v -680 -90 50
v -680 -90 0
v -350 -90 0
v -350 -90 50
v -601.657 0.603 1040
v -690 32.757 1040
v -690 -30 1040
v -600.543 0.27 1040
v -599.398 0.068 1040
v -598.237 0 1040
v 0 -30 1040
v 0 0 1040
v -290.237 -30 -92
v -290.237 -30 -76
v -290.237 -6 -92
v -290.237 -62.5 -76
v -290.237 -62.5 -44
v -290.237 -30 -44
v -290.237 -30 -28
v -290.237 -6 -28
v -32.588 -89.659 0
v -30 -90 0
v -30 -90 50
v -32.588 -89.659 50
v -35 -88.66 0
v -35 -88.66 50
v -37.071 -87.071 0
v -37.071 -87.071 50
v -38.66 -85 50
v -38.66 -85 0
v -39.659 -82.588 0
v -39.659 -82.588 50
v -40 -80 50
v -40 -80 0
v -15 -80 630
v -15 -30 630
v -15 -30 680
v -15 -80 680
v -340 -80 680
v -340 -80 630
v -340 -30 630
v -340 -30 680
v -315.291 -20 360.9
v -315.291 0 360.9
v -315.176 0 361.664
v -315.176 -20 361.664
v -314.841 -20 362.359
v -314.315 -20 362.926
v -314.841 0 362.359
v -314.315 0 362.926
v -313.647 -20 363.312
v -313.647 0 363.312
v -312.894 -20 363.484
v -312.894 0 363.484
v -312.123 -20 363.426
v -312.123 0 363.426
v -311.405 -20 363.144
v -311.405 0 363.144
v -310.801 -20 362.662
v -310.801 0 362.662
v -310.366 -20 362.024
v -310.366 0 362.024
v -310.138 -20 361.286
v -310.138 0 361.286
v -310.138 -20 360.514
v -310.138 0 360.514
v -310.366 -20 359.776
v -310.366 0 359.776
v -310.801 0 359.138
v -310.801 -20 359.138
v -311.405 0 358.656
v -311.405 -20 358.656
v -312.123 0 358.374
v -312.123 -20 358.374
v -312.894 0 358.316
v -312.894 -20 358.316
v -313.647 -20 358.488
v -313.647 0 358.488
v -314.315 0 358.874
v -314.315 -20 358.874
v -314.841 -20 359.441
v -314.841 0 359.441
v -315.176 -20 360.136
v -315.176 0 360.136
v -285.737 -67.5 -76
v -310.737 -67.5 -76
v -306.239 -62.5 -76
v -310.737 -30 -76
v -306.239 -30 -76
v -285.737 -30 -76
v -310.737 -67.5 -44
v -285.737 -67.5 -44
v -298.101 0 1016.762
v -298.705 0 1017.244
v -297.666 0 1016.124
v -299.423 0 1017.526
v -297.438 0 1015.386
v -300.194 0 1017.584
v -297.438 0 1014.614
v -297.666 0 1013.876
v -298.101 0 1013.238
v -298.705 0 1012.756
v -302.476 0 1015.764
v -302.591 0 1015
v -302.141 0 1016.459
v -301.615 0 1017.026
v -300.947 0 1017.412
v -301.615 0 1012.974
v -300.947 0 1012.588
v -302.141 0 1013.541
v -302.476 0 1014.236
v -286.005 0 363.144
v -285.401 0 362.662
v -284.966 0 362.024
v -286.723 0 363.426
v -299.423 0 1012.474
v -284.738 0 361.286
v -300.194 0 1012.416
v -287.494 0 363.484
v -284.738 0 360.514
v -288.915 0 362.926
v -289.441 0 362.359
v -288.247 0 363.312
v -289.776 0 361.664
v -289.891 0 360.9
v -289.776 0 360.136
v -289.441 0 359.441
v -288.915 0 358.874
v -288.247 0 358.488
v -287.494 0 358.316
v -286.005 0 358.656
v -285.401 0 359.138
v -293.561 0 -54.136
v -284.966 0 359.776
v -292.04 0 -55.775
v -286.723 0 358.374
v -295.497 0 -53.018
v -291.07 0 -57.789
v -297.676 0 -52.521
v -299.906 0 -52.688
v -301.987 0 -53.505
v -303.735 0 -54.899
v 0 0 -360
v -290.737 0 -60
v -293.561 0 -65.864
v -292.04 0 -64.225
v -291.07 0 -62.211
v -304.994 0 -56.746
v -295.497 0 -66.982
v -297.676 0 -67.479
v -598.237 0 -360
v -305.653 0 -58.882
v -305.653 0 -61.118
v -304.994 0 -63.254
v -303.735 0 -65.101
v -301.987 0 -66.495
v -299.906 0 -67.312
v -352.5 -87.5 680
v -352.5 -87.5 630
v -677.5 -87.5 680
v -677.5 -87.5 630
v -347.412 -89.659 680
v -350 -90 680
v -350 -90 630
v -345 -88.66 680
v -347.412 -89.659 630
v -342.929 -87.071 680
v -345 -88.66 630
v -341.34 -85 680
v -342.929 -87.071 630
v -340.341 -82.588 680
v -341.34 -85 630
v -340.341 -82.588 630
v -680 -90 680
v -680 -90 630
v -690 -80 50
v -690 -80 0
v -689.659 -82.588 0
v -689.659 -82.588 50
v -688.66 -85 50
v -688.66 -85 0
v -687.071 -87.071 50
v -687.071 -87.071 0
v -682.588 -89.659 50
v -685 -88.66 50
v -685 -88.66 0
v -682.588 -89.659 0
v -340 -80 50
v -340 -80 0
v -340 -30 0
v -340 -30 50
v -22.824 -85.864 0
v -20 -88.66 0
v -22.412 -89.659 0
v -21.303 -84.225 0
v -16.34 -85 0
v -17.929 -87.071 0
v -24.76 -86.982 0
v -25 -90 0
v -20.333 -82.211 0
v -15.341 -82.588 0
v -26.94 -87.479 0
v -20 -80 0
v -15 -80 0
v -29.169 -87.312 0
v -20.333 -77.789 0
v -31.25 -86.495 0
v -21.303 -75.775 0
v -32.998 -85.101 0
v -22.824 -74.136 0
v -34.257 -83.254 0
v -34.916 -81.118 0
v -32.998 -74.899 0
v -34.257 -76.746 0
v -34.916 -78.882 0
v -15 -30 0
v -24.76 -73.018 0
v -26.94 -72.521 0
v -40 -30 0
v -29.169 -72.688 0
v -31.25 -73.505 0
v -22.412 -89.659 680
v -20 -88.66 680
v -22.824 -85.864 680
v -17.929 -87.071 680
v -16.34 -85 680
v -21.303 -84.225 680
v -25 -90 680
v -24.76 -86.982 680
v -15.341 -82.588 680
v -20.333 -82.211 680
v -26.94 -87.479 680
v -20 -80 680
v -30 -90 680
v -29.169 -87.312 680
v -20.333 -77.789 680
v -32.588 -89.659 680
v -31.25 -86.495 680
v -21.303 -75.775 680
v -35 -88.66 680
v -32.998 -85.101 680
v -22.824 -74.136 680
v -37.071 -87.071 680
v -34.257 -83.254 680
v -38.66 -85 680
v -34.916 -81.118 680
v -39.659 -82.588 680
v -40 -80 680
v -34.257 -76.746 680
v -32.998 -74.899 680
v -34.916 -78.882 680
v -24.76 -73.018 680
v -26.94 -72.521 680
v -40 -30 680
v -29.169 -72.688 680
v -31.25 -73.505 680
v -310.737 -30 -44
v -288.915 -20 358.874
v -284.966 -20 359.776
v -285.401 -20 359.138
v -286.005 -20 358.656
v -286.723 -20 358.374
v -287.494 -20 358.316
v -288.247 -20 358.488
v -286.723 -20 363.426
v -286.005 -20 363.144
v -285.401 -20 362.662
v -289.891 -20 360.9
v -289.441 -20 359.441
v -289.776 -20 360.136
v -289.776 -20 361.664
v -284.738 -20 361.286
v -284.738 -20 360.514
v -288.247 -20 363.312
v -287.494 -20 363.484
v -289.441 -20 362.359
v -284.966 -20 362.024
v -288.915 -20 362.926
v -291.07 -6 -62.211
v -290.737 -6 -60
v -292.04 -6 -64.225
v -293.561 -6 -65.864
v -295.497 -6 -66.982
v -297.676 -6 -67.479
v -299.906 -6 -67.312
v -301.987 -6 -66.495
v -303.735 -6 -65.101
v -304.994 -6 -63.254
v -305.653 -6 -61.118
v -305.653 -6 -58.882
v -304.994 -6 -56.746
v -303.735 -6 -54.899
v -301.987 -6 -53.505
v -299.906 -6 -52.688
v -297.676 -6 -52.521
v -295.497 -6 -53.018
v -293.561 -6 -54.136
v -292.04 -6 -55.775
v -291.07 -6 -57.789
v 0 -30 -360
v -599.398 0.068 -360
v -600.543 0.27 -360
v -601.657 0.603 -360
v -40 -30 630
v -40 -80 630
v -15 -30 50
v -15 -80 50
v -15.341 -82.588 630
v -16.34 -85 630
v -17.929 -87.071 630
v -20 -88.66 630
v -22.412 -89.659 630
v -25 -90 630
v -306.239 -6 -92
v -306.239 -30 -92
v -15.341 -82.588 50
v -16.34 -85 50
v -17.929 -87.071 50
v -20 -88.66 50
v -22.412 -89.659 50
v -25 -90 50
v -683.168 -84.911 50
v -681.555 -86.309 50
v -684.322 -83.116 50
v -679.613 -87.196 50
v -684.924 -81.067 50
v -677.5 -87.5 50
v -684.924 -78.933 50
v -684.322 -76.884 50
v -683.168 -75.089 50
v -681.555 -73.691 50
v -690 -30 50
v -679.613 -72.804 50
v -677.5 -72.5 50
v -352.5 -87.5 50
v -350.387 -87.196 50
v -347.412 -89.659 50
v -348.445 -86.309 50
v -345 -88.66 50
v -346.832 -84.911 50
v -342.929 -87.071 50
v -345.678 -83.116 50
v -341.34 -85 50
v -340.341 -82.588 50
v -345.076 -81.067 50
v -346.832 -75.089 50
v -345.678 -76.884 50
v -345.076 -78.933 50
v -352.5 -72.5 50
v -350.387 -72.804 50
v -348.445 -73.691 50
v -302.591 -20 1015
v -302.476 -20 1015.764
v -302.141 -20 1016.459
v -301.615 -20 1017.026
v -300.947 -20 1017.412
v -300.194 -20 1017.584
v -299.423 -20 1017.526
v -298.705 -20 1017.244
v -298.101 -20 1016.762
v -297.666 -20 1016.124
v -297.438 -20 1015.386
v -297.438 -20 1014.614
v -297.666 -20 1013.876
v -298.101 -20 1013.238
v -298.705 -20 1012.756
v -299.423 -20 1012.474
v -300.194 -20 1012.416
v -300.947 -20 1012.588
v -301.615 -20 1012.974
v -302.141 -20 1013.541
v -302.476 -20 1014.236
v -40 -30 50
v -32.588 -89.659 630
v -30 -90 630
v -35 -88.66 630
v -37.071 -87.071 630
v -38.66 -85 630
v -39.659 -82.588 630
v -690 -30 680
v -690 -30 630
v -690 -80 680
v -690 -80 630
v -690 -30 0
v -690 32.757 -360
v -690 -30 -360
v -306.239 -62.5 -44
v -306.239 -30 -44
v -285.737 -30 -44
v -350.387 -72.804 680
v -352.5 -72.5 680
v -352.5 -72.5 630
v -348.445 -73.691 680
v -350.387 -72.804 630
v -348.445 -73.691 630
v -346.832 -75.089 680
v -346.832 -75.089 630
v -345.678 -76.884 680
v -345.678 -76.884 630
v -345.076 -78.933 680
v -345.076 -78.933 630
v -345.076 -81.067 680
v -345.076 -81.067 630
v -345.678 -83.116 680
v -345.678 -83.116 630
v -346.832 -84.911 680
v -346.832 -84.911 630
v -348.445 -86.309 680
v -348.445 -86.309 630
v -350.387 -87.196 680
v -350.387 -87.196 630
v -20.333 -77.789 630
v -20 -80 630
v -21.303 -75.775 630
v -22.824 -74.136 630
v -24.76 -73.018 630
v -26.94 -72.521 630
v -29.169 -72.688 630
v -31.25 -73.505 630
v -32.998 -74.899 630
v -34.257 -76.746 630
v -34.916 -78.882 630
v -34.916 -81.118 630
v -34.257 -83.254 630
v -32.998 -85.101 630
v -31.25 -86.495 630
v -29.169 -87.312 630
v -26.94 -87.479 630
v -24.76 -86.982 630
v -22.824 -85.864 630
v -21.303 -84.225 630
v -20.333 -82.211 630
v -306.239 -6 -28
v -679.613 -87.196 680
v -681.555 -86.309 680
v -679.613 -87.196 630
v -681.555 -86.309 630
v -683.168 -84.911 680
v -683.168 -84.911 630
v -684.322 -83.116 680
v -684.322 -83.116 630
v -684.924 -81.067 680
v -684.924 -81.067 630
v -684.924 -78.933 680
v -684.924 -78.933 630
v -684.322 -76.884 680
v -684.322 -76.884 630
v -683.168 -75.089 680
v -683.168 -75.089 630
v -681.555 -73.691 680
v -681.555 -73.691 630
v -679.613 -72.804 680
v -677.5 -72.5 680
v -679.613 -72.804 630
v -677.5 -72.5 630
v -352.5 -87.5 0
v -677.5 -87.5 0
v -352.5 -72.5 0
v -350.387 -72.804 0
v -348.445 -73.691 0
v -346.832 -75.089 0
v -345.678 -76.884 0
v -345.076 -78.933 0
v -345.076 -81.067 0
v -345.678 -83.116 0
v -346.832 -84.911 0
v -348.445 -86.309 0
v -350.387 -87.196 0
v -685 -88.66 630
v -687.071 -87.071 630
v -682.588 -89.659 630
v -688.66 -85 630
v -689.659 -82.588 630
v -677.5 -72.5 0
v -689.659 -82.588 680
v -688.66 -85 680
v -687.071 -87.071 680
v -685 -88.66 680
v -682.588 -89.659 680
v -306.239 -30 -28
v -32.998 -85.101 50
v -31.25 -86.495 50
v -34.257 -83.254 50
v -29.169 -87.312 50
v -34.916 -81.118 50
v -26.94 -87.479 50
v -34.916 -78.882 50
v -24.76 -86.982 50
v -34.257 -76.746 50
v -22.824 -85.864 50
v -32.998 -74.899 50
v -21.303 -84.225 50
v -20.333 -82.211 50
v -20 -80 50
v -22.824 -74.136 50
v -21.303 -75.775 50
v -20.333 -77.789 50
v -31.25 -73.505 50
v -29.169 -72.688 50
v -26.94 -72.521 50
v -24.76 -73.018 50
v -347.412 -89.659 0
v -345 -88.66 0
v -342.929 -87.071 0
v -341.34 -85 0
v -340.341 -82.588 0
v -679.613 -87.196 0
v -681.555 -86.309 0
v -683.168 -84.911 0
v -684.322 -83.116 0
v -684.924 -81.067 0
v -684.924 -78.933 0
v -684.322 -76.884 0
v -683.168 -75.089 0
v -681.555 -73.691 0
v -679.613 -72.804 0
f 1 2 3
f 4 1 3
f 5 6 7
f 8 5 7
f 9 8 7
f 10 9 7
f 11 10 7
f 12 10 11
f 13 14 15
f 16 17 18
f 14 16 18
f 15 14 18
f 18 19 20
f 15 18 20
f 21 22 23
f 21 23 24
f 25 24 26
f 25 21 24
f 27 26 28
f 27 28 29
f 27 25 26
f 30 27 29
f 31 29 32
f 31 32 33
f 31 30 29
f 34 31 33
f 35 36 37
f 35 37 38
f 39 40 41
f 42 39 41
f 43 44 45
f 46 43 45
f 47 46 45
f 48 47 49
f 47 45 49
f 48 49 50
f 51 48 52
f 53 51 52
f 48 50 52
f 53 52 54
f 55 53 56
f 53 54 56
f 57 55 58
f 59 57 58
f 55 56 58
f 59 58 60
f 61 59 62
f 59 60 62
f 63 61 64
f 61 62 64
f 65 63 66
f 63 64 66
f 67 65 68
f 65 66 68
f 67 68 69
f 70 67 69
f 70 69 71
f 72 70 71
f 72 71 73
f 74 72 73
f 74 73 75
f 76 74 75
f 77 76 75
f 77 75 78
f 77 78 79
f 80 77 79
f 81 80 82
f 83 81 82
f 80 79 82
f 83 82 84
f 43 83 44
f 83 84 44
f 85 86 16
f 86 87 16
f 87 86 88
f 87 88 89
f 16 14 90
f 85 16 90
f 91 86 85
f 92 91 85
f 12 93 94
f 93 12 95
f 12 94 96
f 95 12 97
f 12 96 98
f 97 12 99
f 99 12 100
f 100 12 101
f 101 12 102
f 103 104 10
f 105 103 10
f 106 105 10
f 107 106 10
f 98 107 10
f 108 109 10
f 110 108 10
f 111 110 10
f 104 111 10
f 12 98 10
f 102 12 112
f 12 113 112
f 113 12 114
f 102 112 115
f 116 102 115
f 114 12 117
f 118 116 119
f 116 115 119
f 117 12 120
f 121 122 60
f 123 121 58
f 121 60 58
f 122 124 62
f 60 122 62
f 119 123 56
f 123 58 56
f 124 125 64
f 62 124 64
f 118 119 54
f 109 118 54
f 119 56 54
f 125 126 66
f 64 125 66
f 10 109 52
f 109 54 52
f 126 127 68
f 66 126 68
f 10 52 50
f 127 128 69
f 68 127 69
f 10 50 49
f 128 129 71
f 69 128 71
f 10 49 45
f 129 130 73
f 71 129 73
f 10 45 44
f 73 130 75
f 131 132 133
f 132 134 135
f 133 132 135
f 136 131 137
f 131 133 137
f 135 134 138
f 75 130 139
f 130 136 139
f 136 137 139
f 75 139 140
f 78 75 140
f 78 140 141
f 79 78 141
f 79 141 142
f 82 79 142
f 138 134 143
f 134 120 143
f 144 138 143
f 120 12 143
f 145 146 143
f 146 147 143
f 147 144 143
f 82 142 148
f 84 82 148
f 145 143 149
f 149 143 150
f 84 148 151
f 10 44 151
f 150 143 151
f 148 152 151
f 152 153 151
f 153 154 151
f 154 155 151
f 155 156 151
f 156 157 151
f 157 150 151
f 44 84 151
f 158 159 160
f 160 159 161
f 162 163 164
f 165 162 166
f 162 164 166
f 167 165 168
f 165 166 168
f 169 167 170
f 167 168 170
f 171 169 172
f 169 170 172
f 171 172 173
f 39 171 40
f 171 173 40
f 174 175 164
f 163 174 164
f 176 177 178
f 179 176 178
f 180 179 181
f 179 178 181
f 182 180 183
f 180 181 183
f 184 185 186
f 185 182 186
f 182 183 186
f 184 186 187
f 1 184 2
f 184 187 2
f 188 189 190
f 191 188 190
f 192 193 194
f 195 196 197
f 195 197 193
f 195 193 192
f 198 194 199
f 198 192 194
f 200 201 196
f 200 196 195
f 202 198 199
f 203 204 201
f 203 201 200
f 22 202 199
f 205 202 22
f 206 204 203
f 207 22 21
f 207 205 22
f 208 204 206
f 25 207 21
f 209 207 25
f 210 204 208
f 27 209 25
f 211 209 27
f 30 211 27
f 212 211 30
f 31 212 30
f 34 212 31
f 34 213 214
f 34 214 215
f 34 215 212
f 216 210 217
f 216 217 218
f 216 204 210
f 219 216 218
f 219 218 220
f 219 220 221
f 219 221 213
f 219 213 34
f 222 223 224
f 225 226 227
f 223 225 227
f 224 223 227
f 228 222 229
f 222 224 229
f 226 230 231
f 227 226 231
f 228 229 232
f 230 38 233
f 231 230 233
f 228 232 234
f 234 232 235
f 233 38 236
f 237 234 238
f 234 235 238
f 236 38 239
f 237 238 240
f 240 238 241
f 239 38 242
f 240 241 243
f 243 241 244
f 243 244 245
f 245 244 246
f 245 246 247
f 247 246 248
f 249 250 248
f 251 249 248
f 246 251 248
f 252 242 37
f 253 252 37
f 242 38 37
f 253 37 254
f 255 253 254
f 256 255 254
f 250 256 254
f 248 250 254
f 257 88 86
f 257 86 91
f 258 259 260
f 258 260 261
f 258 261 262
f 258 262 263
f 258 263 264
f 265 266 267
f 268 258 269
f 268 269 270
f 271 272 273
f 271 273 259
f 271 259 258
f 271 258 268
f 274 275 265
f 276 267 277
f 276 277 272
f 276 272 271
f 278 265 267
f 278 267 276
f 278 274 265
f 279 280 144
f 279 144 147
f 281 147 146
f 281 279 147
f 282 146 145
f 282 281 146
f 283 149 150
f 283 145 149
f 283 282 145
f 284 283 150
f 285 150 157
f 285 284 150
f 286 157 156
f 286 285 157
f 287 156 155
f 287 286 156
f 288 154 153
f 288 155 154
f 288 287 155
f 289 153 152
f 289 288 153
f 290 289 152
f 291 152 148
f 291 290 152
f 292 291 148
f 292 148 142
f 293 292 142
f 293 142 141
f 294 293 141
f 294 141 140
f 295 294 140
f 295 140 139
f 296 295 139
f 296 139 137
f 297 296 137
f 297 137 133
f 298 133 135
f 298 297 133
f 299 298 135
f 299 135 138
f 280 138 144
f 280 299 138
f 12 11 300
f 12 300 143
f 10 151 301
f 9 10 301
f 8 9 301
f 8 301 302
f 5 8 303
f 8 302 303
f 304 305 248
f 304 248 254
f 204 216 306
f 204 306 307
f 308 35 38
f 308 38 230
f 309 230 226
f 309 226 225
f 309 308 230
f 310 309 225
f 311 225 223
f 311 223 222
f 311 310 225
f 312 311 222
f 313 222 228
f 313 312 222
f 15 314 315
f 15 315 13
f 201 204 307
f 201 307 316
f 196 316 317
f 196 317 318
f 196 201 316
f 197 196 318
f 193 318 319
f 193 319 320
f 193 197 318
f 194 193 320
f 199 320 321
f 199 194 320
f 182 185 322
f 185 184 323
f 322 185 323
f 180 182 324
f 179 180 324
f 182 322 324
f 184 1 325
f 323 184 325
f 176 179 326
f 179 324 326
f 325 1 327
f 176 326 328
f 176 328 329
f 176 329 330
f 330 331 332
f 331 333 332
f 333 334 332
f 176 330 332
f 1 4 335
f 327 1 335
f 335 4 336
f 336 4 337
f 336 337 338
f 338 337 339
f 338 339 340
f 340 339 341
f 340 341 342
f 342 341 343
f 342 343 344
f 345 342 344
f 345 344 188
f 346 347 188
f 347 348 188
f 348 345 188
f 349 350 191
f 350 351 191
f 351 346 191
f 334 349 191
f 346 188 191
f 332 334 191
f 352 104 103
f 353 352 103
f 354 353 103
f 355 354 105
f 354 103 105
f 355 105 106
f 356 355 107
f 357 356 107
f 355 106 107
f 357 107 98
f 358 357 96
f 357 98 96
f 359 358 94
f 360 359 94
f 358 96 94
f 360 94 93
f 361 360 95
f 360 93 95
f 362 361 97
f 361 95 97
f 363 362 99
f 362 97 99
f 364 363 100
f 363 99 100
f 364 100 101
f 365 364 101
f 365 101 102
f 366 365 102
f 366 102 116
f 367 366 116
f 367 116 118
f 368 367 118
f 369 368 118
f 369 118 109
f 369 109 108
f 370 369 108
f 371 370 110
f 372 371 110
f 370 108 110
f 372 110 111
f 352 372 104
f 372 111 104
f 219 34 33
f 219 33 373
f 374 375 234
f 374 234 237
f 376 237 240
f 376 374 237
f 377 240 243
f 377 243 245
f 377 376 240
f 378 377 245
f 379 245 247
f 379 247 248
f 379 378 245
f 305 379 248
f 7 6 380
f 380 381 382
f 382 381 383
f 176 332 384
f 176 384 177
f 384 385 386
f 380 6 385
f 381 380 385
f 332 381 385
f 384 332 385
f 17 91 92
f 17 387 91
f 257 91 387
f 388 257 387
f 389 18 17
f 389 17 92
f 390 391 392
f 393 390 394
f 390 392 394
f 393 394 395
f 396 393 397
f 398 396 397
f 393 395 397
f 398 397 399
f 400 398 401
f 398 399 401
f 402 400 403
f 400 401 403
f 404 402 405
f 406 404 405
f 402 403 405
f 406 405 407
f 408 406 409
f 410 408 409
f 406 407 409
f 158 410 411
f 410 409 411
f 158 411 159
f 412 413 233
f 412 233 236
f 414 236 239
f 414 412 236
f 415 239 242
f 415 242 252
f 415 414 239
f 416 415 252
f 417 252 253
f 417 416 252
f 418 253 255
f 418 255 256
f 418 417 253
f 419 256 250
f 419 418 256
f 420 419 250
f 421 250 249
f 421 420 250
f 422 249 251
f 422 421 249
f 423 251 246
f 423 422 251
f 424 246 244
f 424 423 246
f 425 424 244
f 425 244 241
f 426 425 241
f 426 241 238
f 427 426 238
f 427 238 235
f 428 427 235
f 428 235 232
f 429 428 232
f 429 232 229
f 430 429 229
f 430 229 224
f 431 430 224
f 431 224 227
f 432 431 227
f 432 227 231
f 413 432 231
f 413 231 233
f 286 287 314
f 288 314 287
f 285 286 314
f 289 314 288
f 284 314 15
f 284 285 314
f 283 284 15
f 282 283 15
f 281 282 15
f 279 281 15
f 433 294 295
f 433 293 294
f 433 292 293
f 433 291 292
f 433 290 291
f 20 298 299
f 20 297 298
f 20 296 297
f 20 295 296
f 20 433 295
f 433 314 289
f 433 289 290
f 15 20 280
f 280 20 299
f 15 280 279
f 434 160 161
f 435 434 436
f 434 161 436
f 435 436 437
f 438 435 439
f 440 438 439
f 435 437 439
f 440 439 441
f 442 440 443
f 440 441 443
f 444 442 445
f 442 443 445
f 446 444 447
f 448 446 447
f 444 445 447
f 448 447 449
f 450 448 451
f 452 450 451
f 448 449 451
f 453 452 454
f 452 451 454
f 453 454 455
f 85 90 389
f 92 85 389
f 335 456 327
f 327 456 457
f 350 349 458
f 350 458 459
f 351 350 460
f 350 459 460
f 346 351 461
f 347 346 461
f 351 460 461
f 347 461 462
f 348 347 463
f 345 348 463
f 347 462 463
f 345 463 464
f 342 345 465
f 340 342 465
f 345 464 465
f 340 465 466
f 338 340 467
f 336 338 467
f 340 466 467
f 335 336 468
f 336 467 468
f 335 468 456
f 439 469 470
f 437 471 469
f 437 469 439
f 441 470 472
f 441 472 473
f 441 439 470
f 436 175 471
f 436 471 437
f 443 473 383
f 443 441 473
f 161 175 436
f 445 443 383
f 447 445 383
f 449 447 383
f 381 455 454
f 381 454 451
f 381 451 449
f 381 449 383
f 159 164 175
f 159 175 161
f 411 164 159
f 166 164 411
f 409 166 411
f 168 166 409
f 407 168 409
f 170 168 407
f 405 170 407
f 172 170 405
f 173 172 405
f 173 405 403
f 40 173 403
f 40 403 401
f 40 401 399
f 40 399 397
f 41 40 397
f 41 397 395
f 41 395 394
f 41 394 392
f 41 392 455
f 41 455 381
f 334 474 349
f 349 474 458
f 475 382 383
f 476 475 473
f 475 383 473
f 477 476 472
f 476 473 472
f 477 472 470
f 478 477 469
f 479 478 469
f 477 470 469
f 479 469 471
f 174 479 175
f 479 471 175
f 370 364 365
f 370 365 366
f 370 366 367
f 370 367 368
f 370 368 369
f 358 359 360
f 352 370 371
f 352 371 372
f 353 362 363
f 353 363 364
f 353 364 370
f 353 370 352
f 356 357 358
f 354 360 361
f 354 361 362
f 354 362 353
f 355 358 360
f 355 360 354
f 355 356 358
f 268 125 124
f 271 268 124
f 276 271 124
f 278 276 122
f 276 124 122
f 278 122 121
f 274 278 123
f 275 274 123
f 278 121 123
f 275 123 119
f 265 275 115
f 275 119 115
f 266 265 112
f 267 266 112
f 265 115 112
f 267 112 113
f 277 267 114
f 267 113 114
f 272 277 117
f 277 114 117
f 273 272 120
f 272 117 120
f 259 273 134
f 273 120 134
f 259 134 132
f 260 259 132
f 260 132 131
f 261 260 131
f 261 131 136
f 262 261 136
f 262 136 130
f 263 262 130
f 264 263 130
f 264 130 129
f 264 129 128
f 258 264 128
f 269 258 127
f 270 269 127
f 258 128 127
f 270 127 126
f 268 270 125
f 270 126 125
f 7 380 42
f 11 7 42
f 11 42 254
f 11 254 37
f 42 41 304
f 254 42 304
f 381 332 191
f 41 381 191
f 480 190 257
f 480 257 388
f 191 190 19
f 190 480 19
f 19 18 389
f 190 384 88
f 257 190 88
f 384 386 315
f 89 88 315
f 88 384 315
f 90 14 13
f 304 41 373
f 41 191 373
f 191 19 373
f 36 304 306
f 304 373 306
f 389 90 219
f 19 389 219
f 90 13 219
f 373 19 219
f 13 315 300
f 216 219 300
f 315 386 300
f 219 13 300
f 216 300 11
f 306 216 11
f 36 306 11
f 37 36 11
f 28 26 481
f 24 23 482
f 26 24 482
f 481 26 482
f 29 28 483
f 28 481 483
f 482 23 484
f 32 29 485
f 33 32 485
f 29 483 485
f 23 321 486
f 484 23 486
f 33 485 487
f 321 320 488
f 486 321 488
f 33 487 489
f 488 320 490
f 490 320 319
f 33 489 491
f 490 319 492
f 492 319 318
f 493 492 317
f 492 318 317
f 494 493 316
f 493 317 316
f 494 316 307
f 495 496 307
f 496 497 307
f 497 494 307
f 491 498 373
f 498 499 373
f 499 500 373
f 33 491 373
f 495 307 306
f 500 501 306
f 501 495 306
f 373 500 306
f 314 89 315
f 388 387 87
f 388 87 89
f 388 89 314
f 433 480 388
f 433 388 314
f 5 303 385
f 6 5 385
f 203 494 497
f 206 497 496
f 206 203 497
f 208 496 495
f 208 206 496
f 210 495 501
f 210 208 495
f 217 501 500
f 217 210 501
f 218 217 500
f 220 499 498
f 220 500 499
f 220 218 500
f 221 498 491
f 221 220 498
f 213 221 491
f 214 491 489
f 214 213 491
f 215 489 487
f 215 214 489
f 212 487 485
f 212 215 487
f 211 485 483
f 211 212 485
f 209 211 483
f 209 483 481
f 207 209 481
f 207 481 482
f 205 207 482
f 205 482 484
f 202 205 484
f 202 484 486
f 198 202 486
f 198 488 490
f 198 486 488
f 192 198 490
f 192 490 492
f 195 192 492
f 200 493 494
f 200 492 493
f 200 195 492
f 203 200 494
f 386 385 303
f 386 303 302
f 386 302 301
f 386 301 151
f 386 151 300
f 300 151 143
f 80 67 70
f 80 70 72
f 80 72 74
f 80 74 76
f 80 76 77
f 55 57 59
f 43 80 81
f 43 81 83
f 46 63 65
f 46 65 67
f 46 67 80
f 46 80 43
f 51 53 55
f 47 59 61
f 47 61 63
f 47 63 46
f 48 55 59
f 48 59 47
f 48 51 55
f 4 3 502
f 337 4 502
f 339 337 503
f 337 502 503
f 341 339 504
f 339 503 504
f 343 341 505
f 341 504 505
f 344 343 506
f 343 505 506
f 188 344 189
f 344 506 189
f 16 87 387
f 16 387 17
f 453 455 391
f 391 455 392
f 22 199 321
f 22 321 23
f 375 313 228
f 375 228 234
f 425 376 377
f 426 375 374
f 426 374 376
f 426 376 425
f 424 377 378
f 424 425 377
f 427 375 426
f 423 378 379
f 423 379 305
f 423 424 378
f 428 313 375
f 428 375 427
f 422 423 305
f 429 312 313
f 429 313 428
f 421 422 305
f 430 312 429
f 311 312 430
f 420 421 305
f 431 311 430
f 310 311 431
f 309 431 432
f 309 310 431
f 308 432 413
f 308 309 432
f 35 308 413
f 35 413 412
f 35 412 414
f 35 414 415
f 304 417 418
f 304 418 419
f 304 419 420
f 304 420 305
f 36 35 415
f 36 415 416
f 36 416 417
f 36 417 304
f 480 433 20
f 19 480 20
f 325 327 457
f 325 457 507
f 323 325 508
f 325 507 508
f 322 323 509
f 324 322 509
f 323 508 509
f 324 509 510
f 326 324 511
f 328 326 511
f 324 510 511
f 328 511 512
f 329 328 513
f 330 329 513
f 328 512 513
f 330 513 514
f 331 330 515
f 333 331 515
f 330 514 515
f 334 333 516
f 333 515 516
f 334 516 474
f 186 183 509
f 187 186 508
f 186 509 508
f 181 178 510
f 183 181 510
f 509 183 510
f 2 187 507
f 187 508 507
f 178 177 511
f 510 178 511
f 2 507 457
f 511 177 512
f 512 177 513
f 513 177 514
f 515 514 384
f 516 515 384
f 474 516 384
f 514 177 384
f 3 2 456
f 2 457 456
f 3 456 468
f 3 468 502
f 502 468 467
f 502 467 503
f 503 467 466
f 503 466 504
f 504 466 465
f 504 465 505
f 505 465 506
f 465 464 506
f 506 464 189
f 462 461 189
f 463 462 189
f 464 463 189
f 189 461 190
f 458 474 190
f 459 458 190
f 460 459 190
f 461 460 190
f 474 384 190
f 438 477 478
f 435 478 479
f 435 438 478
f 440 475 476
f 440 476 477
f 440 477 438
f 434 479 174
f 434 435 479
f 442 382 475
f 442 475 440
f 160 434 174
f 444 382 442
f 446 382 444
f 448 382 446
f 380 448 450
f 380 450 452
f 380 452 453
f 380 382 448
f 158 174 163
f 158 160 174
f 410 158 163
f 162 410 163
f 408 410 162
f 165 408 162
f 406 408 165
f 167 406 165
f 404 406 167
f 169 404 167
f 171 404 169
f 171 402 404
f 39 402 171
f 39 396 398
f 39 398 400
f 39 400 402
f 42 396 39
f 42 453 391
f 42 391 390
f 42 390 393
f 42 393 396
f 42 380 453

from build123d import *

# Parameters (mm, degrees)
BOSS_EXTRUDE1_DEPTH      = 1040
BOSS_EXTRUDE1_DEPTH_BACK = 360
SKETCH2_R                = 7.5
BOSS_EXTRUDE2_DEPTH      = 680
SKETCH4_W                = 580
SKETCH4_H                = 10
CUT_EXTRUDE1_DEPTH       = 1252.319303775
CUT_EXTRUDE2_DEPTH       = 1252.319303775
CUT_EXTRUDE2_DEPTH_BACK  = 1252.319303775
SKETCH5_W                = 580
SKETCH5_H                = 50
CUT_EXTRUDE3_DEPTH       = 1252.319303775
CUT_EXTRUDE3_DEPTH_BACK  = 1252.319303775
SKETCH6_R                = 7.5
SKETCH8_W                = 25
SKETCH8_H                = 32
BOSS_EXTRUDE4_DEPTH      = 37.5
SKETCH9_W                = 16.002
SKETCH9_H                = 32.5
CUT_EXTRUDE4_DEPTH       = 66.8
SKETCH11_W               = 16.002
SKETCH11_H               = 64
CUT_EXTRUDE5_DEPTH       = 24
SKETCH13_R               = 2.5908
CUT_EXTRUDE6_DEPTH       = 20


with BuildPart() as part:
    # Sketch1 → Boss-Extrude1 (new, two sides: drawn at the far end of the back side and taken through both)
    with BuildSketch(Plane.XY.offset(-BOSS_EXTRUDE1_DEPTH_BACK)):
        with BuildLine():
            Line((0, 0), (-598.236730193, 0))
            ThreePointArc((-598.236730193, 0), (-599.97321197, 0.15192247), (-601.656931626, 0.603073792))
            Line((-601.656931626, 0.603073792), (-690, 32.757321084))
            Line((-690, 32.757321084), (-690, -30))
            Line((-690, -30), (-656.445665216, -30))
            Line((-656.445665216, -30), (-26.446144718, -30))
            Line((-26.446144718, -30), (0, -30))
            Line((0, -30), (0, -20.000479502))
            Line((0, -20.000479502), (0, 0))
        make_face()
    extrude(amount=BOSS_EXTRUDE1_DEPTH + BOSS_EXTRUDE1_DEPTH_BACK)

    # Sketch2 → Boss-Extrude2 (add)
    # profile 1 of 2: a face of its own
    with BuildSketch(Plane.XY):
        with BuildLine():
            Line((-690, -30), (-690, -80))
            ThreePointArc((-690, -80), (-687.071067812, -87.071067812), (-680, -90))
            Line((-680, -90), (-350, -90))
            ThreePointArc((-350, -90), (-342.928932188, -87.071067812), (-340, -80))
            Line((-340, -80), (-340, -30))
            Line((-340, -30), (-690, -30))
        make_face()
        with BuildLine():
            Line((-677.5, -72.5), (-352.5, -72.5))
            ThreePointArc((-352.5, -72.5), (-345, -80), (-352.5, -87.5))
            Line((-352.5, -87.5), (-677.5, -87.5))
            ThreePointArc((-677.5, -87.5), (-685, -80), (-677.5, -72.5))
        make_face(mode=Mode.SUBTRACT)
    # profile 2 of 2: a face of its own
    with BuildSketch(Plane.XY):
        with BuildLine():
            Line((-15, -30), (-15, -80))
            ThreePointArc((-15, -80), (-17.928932188, -87.071067812), (-25, -90))
            Line((-25, -90), (-30, -90))
            ThreePointArc((-30, -90), (-37.071067812, -87.071067812), (-40, -80))
            Line((-40, -80), (-40, -30))
            Line((-40, -30), (-15, -30))
        make_face()
        with Locations((-27.5, -80)):
            Circle(SKETCH2_R, mode=Mode.SUBTRACT)
    extrude(amount=BOSS_EXTRUDE2_DEPTH)

    # Sketch4 → Cut-Extrude1 (cut, through all)
    with BuildSketch(Plane(origin=(0, 0, 0), x_dir=(0, 0, -1), z_dir=(1, 0, 0))):
        with Locations((-340, -85)):
            Rectangle(SKETCH4_W, SKETCH4_H)
    extrude(amount=-CUT_EXTRUDE1_DEPTH, mode=Mode.SUBTRACT)

    # Sketch5 → Cut-Extrude2 (cut, two sides: drawn at the far end of the back side and taken through both)
    with BuildSketch(Plane.ZY.offset(690).offset(-CUT_EXTRUDE2_DEPTH_BACK)):
        with Locations((340, -55)):
            Rectangle(SKETCH5_W, SKETCH5_H)
    extrude(amount=CUT_EXTRUDE2_DEPTH + CUT_EXTRUDE2_DEPTH_BACK, mode=Mode.SUBTRACT)

    # Sketch6 → Cut-Extrude3 (cut, two sides: drawn at the far end of the back side and taken through both)
    with BuildSketch(Plane(origin=(0, 0, 0), x_dir=(1, 0, 0), z_dir=(0, 1, 0)).offset(-CUT_EXTRUDE3_DEPTH_BACK)):
        with Locations((-298.236730193, 60)):
            Circle(SKETCH6_R)
    extrude(amount=CUT_EXTRUDE3_DEPTH + CUT_EXTRUDE3_DEPTH_BACK, mode=Mode.SUBTRACT)

    # Sketch8 → Boss-Extrude4 (add)
    with BuildSketch(Plane.XZ.offset(30)):
        with Locations((-298.236730193, -60)):
            Rectangle(SKETCH8_W, SKETCH8_H)
    extrude(amount=BOSS_EXTRUDE4_DEPTH)

    # Sketch9 → Cut-Extrude4 (cut)
    with BuildSketch(Plane.XY.offset(-44)):
        with Locations((-298.237730193, -46.25)):
            Rectangle(SKETCH9_W, SKETCH9_H)
    extrude(amount=-CUT_EXTRUDE4_DEPTH, mode=Mode.SUBTRACT)

    # Sketch11 → Cut-Extrude5 (cut)
    with BuildSketch(Plane.XZ.offset(30)):
        with Locations((-298.237730193, -60)):
            Rectangle(SKETCH11_W, SKETCH11_H)
    extrude(amount=-CUT_EXTRUDE5_DEPTH, mode=Mode.SUBTRACT)

    # Sketch13 → Cut-Extrude6 (cut)
    with BuildSketch(Plane(origin=(0, 0, 0), x_dir=(1, 0, 0), z_dir=(0, 1, 0))):
        with Locations(Location((-300, -1015, 0), (0, 0, 180))):
            Circle(SKETCH13_R)
        with Locations(Location((-287.3, -360.9, 0), (0, 0, 180))):
            Circle(SKETCH13_R)
        with Locations(Location((-312.7, -360.9, 0), (0, 0, 180))):
            Circle(SKETCH13_R)
    extrude(amount=-CUT_EXTRUDE6_DEPTH, mode=Mode.SUBTRACT)


solid = part.part
